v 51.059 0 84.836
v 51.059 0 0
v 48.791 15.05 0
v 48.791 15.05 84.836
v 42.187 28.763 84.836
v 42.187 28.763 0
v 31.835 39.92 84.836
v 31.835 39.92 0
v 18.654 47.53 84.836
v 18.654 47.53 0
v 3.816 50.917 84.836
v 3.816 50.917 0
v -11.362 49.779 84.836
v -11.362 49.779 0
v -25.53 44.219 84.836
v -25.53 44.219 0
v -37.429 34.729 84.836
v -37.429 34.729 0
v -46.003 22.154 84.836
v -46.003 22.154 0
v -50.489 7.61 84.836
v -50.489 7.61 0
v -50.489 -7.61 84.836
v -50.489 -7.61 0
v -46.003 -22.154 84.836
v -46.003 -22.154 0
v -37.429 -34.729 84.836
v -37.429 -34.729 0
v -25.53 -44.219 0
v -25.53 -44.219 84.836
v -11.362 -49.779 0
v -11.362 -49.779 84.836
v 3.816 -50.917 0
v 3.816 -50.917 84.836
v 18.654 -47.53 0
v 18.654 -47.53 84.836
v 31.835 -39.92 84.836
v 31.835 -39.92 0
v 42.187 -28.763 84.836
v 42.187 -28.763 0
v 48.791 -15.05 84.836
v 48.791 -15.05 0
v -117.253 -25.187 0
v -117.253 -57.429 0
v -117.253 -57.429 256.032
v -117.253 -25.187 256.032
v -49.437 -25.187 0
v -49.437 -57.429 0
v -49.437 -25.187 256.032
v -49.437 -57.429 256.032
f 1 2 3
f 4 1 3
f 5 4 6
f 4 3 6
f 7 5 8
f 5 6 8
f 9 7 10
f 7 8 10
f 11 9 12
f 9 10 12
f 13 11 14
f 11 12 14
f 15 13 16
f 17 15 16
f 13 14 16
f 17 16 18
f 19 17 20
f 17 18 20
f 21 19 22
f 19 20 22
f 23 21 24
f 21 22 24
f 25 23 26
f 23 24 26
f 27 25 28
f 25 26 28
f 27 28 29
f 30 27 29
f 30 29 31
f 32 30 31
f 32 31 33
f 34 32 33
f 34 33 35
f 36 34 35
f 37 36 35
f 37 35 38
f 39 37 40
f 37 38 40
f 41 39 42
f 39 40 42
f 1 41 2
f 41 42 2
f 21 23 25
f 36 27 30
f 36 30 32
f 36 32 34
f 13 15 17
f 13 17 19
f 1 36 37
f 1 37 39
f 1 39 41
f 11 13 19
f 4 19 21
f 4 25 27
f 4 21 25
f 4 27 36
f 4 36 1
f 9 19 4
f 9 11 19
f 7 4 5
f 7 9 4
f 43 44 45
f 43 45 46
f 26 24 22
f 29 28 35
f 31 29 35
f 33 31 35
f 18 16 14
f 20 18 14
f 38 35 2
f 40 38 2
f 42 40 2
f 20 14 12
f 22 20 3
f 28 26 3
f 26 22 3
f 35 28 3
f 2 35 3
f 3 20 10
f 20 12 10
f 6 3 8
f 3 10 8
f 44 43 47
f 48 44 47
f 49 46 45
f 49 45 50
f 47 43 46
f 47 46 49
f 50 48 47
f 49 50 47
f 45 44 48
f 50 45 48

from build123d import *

# Parameters (mm, degrees)
F0_R     = 51.059326
F1_DEPTH = 84.836
F2_W     = 67.816258
F2_H     = 32.241601
F3_DEPTH = 256.032


with BuildPart() as f1:
    # F0 (on Top) → F1 (new body)
    with BuildSketch(Plane.XY):
        Circle(F0_R)
    extrude(amount=F1_DEPTH)


with BuildPart() as f3:
    # F2 (on Top) → F3 (new body)
    with BuildSketch(Plane.XY):
        with Locations((-83.344713, -41.307842)):
            Rectangle(F2_W, F2_H)
    extrude(amount=F3_DEPTH)


solid = Compound([f1.part, f3.part])
